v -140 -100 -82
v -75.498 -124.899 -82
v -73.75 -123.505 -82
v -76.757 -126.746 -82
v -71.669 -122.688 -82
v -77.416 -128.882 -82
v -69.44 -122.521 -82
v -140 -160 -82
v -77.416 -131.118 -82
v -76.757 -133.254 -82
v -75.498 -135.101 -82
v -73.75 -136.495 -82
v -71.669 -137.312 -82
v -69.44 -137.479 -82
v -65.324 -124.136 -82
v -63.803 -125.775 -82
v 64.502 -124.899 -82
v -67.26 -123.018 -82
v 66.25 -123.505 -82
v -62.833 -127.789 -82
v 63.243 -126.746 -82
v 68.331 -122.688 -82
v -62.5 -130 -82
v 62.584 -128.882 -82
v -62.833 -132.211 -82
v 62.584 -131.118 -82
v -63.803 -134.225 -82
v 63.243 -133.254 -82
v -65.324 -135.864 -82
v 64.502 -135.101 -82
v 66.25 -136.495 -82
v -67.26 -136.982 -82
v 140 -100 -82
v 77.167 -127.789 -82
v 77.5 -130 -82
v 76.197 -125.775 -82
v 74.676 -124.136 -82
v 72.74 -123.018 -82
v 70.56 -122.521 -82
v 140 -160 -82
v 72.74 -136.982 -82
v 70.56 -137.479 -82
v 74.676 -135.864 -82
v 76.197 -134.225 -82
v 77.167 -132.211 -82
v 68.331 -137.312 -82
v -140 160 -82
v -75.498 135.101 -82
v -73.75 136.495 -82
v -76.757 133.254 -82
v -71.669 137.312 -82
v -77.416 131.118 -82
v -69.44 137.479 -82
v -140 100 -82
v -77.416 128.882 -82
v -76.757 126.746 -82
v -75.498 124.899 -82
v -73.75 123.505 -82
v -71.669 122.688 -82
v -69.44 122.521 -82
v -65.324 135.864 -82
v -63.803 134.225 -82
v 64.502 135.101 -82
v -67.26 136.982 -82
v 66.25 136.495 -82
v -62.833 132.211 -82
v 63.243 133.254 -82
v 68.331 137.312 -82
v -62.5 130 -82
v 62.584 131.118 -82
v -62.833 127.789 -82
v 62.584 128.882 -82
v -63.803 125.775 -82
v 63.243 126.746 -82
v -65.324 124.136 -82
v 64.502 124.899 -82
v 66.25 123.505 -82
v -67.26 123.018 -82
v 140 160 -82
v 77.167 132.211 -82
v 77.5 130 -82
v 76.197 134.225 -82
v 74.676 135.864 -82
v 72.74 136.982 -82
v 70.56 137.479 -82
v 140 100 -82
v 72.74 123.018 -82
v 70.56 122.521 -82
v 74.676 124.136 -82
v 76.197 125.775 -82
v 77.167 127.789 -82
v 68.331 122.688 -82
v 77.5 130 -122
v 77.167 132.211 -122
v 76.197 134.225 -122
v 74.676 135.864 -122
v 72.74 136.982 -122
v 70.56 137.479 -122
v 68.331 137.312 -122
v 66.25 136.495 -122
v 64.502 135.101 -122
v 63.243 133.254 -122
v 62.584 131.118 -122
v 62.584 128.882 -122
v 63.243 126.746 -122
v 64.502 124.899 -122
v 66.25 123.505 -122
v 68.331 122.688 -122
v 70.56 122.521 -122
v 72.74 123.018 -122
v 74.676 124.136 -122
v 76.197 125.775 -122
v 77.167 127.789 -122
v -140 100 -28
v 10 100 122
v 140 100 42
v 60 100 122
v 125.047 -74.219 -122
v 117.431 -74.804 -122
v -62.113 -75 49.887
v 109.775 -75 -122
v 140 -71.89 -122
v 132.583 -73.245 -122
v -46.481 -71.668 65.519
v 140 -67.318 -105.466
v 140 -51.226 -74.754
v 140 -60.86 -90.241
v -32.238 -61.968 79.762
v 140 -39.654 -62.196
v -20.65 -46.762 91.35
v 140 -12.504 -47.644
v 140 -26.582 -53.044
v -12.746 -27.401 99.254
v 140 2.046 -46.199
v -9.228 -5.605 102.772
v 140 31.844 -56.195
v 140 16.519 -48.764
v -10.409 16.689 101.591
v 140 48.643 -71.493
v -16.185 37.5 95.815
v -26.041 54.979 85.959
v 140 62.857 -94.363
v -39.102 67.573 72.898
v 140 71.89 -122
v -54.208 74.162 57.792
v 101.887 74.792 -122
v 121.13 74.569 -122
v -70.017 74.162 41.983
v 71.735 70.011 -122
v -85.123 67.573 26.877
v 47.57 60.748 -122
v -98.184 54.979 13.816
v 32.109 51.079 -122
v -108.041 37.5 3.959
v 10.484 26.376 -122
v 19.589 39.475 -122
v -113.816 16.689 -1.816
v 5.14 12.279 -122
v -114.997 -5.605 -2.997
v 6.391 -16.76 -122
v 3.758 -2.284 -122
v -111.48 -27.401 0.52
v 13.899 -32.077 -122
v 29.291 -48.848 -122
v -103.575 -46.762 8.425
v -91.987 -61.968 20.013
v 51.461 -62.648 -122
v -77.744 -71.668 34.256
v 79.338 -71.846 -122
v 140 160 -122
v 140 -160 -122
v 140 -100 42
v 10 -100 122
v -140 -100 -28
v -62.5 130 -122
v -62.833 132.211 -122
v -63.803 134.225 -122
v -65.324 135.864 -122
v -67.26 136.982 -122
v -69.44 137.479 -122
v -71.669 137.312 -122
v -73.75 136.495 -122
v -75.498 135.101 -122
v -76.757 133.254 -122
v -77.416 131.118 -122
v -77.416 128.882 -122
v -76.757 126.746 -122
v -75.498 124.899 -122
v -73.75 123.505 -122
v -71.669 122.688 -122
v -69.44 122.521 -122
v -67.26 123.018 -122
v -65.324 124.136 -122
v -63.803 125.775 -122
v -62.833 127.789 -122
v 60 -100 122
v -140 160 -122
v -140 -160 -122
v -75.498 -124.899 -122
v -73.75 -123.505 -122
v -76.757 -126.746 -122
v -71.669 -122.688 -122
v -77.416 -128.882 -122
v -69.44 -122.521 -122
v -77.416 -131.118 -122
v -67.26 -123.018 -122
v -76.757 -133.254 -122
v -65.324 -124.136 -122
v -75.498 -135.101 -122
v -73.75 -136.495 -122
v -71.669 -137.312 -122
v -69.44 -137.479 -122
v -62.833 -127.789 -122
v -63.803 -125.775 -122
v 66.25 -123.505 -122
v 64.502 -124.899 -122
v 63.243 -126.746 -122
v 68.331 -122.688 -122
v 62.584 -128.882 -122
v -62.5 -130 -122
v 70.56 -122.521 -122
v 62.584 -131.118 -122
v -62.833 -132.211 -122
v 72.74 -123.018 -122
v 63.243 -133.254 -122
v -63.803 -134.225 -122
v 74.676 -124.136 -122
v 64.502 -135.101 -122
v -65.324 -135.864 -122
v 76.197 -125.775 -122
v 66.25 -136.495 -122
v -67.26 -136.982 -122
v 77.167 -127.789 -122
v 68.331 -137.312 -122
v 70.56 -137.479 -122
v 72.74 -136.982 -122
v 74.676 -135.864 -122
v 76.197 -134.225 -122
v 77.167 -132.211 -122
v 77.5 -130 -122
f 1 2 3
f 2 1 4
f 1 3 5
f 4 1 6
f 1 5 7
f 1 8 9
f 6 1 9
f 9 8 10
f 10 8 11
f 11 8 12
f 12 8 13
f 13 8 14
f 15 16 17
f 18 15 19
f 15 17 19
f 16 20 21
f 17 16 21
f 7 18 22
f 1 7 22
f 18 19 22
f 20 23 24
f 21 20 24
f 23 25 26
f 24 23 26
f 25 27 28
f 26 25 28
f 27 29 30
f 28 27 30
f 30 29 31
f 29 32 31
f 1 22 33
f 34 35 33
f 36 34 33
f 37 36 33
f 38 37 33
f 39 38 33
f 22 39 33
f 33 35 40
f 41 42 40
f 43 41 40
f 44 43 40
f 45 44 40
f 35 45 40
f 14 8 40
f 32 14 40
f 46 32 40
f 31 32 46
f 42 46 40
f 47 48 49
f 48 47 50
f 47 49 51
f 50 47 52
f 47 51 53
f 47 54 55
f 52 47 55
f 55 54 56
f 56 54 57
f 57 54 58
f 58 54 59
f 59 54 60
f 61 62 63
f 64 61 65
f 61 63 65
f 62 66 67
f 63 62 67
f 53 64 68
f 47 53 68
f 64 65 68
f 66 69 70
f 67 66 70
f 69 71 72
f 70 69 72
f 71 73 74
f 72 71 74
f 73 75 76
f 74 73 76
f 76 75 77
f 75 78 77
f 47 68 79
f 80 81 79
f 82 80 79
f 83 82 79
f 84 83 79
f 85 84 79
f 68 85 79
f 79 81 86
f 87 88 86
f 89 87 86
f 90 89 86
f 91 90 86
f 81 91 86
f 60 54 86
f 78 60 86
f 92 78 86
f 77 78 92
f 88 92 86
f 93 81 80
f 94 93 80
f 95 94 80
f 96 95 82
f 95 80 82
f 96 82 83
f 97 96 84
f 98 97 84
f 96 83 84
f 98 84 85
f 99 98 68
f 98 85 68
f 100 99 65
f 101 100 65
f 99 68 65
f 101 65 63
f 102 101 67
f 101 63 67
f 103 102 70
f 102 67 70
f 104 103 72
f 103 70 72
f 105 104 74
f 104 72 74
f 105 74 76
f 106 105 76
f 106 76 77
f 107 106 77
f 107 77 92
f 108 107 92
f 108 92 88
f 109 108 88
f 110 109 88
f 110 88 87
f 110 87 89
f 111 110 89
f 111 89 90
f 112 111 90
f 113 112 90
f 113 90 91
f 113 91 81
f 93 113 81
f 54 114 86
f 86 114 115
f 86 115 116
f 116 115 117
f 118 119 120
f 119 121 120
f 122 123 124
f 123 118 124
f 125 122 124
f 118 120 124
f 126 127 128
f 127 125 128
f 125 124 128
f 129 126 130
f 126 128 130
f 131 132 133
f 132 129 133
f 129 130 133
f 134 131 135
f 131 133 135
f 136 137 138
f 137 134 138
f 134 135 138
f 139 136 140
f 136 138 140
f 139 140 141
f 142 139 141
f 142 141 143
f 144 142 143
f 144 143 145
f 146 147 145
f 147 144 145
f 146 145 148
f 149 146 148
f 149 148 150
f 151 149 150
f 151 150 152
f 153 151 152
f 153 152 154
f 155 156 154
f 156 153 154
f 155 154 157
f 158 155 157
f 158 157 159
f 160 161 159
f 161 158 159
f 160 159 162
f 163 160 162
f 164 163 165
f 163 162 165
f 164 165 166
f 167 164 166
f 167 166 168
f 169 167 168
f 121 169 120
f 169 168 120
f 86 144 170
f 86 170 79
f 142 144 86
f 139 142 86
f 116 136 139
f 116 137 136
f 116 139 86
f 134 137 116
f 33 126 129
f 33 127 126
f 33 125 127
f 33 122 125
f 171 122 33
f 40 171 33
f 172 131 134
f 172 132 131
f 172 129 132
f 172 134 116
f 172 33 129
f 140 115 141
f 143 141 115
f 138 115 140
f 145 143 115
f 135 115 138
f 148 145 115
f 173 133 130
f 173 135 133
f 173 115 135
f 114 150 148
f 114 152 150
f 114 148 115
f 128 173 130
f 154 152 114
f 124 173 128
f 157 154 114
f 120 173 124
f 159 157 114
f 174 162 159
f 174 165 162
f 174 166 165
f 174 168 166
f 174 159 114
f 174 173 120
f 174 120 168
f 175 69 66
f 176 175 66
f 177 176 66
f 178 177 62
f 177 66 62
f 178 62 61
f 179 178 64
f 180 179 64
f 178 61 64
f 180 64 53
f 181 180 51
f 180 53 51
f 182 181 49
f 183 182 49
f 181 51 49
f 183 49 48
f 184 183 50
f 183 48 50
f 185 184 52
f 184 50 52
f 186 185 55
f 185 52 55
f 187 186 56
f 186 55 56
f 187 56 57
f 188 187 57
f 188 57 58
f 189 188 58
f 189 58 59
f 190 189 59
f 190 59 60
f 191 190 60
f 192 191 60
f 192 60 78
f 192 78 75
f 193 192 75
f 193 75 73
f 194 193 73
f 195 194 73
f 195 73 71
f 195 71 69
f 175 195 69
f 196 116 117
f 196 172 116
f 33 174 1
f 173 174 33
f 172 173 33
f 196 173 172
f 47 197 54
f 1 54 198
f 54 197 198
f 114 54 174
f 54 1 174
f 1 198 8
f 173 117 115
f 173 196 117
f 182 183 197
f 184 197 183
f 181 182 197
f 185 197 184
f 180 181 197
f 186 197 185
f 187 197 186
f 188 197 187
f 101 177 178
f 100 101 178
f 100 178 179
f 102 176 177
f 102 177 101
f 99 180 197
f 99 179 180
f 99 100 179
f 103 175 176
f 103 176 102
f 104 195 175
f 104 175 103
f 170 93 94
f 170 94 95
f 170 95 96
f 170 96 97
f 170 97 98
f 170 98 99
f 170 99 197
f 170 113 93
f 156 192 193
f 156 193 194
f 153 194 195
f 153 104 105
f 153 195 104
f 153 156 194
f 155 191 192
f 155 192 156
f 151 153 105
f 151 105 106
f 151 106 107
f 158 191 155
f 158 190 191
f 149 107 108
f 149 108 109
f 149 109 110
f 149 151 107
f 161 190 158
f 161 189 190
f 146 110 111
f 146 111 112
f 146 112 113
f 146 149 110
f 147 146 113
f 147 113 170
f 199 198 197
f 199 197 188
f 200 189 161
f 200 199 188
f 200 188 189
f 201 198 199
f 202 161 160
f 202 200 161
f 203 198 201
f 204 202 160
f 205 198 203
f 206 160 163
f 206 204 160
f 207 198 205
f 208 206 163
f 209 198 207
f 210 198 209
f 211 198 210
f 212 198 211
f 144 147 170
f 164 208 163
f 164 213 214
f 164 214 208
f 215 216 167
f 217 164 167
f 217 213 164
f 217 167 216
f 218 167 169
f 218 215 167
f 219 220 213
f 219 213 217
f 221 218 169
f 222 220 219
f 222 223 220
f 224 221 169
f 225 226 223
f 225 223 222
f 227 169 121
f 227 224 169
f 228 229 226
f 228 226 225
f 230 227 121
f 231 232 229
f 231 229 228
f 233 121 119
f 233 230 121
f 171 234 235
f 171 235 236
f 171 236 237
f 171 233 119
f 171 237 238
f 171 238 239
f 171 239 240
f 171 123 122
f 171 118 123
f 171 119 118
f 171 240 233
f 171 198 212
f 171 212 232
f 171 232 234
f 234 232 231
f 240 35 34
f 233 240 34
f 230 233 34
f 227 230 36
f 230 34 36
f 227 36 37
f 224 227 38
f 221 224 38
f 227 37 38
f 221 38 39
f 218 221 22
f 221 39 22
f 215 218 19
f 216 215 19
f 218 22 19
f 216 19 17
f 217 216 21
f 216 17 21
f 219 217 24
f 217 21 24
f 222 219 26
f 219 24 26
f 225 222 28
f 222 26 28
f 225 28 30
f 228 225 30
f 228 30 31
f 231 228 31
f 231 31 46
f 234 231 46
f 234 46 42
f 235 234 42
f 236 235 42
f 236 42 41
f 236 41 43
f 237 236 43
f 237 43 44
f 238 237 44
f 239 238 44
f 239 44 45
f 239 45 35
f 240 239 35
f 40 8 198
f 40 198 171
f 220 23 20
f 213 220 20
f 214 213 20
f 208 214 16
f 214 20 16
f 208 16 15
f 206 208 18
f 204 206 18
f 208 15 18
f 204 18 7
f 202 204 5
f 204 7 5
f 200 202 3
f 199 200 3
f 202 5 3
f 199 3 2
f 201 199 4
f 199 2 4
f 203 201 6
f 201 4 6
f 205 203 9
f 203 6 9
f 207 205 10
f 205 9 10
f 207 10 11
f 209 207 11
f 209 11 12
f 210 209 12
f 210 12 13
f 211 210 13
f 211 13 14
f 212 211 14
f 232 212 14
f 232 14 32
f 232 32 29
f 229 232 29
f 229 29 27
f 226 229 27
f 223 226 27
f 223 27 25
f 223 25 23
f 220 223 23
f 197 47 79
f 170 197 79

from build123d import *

# Parameters (mm, degrees)
F0_W     = 280
F0_H     = 40
F1_DEPTH = 160
F2_DEPTH = 100
F4_R     = 7.5
F5_R     = 7.5
F6_DEPTH = 40.001
F3_R     = 75
F7_DEPTH = 264.4589361638


with BuildPart() as f1:
    # F0 (on Front) → F1 (new body, symmetric)
    with BuildSketch(Plane.XZ):
        with Locations((0, -102)):
            Rectangle(F0_W, F0_H)
    extrude(amount=F1_DEPTH, both=True)

    # F0 (on Front) → F2 (join, symmetric)
    with BuildSketch(Plane.XZ):
        Polygon((60, 122), (10, 122), (-140, -28), (-140, -82), (140, -82), (140, 42), align=None)
    extrude(amount=F2_DEPTH, both=True)

    # F4 (on face) + F5 (on face) → F6 (cut, through all)
    with BuildSketch(Plane.XY.offset(-82)):
        with Locations((70, 130)):
            Circle(F4_R)
        with Locations((-70, 130)):
            Circle(F4_R)
    with BuildSketch(Plane.XY.offset(-82)):
        with Locations((-70, -130)):
            Circle(F5_R)
        with Locations((70, -130)):
            Circle(F5_R)
    extrude(amount=-F6_DEPTH, mode=Mode.SUBTRACT)

    # F3 (on face) → F7 (cut, through all)
    with BuildSketch(Plane(origin=(-56, 0, 56), x_dir=(0, -1, 0), z_dir=(-0.7071067812, 0, 0.7071067812))):
        with Locations((0, -8.6445035856)):
            Circle(F3_R)
    extrude(amount=-F7_DEPTH, mode=Mode.SUBTRACT)


solid = f1.part
